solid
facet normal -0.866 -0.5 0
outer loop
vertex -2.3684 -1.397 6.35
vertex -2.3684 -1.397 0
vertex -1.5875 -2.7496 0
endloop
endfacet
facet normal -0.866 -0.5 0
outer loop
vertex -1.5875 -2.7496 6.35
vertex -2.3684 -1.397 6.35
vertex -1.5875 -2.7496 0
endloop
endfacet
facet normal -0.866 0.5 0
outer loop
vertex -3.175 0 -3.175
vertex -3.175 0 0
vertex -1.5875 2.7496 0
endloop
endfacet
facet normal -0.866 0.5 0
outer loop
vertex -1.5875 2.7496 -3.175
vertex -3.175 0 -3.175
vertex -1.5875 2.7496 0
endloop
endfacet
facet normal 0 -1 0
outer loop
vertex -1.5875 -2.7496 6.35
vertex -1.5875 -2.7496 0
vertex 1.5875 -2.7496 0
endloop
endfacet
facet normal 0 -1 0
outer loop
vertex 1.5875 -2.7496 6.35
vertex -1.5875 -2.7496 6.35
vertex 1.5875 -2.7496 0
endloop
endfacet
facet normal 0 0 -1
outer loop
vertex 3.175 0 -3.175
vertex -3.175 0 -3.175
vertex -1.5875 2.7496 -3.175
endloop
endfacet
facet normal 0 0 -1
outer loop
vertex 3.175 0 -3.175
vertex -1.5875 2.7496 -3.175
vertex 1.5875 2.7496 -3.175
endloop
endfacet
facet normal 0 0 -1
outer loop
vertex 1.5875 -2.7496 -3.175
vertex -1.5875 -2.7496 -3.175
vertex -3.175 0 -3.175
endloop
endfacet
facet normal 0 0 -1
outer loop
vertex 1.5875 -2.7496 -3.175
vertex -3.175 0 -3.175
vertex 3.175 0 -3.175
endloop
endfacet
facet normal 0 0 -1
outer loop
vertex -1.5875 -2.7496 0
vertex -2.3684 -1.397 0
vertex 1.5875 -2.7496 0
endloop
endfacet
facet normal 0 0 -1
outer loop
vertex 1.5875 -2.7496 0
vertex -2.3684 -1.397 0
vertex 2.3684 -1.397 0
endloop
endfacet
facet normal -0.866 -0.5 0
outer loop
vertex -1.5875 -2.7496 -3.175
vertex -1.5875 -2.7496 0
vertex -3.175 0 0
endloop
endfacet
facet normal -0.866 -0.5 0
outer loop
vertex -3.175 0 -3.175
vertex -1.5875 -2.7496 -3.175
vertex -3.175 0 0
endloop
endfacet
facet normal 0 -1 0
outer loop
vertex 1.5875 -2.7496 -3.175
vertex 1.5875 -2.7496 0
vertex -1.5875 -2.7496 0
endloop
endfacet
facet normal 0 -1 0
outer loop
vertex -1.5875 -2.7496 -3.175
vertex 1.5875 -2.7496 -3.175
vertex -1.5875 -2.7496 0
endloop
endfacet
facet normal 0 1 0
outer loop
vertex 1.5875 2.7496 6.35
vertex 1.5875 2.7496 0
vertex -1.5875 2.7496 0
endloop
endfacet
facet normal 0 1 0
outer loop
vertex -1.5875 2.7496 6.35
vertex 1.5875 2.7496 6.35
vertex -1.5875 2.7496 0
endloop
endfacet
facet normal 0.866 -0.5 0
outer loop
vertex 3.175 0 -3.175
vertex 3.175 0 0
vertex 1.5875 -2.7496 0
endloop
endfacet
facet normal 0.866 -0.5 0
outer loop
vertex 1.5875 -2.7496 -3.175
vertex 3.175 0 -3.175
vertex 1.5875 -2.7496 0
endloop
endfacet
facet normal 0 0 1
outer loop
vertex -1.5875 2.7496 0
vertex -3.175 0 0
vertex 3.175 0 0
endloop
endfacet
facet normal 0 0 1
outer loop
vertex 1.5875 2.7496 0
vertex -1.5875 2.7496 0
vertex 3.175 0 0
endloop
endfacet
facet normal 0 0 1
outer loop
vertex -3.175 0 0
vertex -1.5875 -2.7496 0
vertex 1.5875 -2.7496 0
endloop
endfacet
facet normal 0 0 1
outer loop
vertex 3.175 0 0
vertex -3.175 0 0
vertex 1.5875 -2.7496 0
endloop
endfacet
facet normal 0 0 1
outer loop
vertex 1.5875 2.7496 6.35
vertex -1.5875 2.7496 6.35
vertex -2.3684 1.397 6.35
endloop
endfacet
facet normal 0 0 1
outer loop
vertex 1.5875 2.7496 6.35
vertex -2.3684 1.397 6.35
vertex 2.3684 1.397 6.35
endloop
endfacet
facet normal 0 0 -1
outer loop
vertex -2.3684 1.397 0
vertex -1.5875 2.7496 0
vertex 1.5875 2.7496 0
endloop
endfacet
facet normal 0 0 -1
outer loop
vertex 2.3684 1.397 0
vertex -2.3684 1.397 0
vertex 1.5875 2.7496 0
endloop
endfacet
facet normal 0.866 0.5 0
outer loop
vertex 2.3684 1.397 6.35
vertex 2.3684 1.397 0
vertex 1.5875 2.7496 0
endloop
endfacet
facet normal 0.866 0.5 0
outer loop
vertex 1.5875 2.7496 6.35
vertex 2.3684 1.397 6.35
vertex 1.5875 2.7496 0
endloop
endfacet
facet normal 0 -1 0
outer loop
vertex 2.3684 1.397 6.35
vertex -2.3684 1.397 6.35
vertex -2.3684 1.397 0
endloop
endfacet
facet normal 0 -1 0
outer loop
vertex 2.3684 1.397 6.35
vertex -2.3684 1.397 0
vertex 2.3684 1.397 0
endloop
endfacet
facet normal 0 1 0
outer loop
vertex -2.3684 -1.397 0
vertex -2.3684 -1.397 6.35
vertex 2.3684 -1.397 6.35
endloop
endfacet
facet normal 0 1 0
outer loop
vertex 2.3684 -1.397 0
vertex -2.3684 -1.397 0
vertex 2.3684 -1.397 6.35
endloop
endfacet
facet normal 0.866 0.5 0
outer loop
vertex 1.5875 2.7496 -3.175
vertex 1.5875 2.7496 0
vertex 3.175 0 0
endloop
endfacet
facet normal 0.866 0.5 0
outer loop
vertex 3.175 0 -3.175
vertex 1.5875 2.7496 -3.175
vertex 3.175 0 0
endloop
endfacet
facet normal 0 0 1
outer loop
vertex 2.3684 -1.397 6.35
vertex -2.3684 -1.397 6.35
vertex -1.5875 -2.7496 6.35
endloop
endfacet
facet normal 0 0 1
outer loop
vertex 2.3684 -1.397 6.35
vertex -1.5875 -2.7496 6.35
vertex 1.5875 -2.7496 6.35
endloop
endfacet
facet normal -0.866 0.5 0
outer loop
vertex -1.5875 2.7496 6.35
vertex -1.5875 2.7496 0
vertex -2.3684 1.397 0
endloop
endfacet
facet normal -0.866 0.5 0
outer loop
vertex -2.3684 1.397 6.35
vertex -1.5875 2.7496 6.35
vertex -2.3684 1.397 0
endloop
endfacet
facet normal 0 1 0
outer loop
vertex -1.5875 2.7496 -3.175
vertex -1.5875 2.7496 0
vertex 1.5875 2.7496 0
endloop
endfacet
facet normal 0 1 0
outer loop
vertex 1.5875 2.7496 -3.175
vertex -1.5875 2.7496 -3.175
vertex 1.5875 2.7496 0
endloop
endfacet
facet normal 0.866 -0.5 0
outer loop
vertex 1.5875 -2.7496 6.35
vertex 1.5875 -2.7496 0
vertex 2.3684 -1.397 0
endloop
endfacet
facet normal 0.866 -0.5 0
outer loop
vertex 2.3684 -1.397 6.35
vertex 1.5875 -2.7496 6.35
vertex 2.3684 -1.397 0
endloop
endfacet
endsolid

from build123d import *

# Parameters (mm, degrees)
F1_DEPTH = 12.7
F2_W     = 6.604
F2_H     = 2.794
F3_DEPTH = 12.701
F4_R     = 3.434136
F5_DEPTH = 6.35
F7_DEPTH = 3.175


with BuildPart() as f1:
    # F0 (on Top) → F1 (new body)
    with BuildSketch(Plane.XY):
        Polygon((-1.5875, -2.749631), (1.5875, -2.749631), (3.175, 0), (1.5875, 2.749631), (-1.5875, 2.749631), (-3.175, 0), align=None)
    extrude(amount=F1_DEPTH)

    # F2 (on face) → F3 (cut, through all)
    with BuildSketch(Plane.XY.offset(12.7)):
        Rectangle(F2_W, F2_H)
    extrude(amount=-F3_DEPTH, mode=Mode.SUBTRACT)

    # F4 (on face) → F5 (cut)
    with BuildSketch(Plane.XY.offset(12.7)):
        Circle(F4_R)
    extrude(amount=-F5_DEPTH, mode=Mode.SUBTRACT)


with BuildPart() as f7:
    # F6 (on face) → F7 (new body)
    with BuildSketch(Plane(origin=(0, 0, 0), x_dir=(1, 0, 0), z_dir=(0, 0, -1))):
        Polygon((1.5875, 2.749631), (-1.5875, 2.749631), (-3.175, 0), (-1.5875, -2.749631), (1.5875, -2.749631), (3.175, 0), align=None)
    extrude(amount=F7_DEPTH)


solid = Compound([f1.part, f7.part])
